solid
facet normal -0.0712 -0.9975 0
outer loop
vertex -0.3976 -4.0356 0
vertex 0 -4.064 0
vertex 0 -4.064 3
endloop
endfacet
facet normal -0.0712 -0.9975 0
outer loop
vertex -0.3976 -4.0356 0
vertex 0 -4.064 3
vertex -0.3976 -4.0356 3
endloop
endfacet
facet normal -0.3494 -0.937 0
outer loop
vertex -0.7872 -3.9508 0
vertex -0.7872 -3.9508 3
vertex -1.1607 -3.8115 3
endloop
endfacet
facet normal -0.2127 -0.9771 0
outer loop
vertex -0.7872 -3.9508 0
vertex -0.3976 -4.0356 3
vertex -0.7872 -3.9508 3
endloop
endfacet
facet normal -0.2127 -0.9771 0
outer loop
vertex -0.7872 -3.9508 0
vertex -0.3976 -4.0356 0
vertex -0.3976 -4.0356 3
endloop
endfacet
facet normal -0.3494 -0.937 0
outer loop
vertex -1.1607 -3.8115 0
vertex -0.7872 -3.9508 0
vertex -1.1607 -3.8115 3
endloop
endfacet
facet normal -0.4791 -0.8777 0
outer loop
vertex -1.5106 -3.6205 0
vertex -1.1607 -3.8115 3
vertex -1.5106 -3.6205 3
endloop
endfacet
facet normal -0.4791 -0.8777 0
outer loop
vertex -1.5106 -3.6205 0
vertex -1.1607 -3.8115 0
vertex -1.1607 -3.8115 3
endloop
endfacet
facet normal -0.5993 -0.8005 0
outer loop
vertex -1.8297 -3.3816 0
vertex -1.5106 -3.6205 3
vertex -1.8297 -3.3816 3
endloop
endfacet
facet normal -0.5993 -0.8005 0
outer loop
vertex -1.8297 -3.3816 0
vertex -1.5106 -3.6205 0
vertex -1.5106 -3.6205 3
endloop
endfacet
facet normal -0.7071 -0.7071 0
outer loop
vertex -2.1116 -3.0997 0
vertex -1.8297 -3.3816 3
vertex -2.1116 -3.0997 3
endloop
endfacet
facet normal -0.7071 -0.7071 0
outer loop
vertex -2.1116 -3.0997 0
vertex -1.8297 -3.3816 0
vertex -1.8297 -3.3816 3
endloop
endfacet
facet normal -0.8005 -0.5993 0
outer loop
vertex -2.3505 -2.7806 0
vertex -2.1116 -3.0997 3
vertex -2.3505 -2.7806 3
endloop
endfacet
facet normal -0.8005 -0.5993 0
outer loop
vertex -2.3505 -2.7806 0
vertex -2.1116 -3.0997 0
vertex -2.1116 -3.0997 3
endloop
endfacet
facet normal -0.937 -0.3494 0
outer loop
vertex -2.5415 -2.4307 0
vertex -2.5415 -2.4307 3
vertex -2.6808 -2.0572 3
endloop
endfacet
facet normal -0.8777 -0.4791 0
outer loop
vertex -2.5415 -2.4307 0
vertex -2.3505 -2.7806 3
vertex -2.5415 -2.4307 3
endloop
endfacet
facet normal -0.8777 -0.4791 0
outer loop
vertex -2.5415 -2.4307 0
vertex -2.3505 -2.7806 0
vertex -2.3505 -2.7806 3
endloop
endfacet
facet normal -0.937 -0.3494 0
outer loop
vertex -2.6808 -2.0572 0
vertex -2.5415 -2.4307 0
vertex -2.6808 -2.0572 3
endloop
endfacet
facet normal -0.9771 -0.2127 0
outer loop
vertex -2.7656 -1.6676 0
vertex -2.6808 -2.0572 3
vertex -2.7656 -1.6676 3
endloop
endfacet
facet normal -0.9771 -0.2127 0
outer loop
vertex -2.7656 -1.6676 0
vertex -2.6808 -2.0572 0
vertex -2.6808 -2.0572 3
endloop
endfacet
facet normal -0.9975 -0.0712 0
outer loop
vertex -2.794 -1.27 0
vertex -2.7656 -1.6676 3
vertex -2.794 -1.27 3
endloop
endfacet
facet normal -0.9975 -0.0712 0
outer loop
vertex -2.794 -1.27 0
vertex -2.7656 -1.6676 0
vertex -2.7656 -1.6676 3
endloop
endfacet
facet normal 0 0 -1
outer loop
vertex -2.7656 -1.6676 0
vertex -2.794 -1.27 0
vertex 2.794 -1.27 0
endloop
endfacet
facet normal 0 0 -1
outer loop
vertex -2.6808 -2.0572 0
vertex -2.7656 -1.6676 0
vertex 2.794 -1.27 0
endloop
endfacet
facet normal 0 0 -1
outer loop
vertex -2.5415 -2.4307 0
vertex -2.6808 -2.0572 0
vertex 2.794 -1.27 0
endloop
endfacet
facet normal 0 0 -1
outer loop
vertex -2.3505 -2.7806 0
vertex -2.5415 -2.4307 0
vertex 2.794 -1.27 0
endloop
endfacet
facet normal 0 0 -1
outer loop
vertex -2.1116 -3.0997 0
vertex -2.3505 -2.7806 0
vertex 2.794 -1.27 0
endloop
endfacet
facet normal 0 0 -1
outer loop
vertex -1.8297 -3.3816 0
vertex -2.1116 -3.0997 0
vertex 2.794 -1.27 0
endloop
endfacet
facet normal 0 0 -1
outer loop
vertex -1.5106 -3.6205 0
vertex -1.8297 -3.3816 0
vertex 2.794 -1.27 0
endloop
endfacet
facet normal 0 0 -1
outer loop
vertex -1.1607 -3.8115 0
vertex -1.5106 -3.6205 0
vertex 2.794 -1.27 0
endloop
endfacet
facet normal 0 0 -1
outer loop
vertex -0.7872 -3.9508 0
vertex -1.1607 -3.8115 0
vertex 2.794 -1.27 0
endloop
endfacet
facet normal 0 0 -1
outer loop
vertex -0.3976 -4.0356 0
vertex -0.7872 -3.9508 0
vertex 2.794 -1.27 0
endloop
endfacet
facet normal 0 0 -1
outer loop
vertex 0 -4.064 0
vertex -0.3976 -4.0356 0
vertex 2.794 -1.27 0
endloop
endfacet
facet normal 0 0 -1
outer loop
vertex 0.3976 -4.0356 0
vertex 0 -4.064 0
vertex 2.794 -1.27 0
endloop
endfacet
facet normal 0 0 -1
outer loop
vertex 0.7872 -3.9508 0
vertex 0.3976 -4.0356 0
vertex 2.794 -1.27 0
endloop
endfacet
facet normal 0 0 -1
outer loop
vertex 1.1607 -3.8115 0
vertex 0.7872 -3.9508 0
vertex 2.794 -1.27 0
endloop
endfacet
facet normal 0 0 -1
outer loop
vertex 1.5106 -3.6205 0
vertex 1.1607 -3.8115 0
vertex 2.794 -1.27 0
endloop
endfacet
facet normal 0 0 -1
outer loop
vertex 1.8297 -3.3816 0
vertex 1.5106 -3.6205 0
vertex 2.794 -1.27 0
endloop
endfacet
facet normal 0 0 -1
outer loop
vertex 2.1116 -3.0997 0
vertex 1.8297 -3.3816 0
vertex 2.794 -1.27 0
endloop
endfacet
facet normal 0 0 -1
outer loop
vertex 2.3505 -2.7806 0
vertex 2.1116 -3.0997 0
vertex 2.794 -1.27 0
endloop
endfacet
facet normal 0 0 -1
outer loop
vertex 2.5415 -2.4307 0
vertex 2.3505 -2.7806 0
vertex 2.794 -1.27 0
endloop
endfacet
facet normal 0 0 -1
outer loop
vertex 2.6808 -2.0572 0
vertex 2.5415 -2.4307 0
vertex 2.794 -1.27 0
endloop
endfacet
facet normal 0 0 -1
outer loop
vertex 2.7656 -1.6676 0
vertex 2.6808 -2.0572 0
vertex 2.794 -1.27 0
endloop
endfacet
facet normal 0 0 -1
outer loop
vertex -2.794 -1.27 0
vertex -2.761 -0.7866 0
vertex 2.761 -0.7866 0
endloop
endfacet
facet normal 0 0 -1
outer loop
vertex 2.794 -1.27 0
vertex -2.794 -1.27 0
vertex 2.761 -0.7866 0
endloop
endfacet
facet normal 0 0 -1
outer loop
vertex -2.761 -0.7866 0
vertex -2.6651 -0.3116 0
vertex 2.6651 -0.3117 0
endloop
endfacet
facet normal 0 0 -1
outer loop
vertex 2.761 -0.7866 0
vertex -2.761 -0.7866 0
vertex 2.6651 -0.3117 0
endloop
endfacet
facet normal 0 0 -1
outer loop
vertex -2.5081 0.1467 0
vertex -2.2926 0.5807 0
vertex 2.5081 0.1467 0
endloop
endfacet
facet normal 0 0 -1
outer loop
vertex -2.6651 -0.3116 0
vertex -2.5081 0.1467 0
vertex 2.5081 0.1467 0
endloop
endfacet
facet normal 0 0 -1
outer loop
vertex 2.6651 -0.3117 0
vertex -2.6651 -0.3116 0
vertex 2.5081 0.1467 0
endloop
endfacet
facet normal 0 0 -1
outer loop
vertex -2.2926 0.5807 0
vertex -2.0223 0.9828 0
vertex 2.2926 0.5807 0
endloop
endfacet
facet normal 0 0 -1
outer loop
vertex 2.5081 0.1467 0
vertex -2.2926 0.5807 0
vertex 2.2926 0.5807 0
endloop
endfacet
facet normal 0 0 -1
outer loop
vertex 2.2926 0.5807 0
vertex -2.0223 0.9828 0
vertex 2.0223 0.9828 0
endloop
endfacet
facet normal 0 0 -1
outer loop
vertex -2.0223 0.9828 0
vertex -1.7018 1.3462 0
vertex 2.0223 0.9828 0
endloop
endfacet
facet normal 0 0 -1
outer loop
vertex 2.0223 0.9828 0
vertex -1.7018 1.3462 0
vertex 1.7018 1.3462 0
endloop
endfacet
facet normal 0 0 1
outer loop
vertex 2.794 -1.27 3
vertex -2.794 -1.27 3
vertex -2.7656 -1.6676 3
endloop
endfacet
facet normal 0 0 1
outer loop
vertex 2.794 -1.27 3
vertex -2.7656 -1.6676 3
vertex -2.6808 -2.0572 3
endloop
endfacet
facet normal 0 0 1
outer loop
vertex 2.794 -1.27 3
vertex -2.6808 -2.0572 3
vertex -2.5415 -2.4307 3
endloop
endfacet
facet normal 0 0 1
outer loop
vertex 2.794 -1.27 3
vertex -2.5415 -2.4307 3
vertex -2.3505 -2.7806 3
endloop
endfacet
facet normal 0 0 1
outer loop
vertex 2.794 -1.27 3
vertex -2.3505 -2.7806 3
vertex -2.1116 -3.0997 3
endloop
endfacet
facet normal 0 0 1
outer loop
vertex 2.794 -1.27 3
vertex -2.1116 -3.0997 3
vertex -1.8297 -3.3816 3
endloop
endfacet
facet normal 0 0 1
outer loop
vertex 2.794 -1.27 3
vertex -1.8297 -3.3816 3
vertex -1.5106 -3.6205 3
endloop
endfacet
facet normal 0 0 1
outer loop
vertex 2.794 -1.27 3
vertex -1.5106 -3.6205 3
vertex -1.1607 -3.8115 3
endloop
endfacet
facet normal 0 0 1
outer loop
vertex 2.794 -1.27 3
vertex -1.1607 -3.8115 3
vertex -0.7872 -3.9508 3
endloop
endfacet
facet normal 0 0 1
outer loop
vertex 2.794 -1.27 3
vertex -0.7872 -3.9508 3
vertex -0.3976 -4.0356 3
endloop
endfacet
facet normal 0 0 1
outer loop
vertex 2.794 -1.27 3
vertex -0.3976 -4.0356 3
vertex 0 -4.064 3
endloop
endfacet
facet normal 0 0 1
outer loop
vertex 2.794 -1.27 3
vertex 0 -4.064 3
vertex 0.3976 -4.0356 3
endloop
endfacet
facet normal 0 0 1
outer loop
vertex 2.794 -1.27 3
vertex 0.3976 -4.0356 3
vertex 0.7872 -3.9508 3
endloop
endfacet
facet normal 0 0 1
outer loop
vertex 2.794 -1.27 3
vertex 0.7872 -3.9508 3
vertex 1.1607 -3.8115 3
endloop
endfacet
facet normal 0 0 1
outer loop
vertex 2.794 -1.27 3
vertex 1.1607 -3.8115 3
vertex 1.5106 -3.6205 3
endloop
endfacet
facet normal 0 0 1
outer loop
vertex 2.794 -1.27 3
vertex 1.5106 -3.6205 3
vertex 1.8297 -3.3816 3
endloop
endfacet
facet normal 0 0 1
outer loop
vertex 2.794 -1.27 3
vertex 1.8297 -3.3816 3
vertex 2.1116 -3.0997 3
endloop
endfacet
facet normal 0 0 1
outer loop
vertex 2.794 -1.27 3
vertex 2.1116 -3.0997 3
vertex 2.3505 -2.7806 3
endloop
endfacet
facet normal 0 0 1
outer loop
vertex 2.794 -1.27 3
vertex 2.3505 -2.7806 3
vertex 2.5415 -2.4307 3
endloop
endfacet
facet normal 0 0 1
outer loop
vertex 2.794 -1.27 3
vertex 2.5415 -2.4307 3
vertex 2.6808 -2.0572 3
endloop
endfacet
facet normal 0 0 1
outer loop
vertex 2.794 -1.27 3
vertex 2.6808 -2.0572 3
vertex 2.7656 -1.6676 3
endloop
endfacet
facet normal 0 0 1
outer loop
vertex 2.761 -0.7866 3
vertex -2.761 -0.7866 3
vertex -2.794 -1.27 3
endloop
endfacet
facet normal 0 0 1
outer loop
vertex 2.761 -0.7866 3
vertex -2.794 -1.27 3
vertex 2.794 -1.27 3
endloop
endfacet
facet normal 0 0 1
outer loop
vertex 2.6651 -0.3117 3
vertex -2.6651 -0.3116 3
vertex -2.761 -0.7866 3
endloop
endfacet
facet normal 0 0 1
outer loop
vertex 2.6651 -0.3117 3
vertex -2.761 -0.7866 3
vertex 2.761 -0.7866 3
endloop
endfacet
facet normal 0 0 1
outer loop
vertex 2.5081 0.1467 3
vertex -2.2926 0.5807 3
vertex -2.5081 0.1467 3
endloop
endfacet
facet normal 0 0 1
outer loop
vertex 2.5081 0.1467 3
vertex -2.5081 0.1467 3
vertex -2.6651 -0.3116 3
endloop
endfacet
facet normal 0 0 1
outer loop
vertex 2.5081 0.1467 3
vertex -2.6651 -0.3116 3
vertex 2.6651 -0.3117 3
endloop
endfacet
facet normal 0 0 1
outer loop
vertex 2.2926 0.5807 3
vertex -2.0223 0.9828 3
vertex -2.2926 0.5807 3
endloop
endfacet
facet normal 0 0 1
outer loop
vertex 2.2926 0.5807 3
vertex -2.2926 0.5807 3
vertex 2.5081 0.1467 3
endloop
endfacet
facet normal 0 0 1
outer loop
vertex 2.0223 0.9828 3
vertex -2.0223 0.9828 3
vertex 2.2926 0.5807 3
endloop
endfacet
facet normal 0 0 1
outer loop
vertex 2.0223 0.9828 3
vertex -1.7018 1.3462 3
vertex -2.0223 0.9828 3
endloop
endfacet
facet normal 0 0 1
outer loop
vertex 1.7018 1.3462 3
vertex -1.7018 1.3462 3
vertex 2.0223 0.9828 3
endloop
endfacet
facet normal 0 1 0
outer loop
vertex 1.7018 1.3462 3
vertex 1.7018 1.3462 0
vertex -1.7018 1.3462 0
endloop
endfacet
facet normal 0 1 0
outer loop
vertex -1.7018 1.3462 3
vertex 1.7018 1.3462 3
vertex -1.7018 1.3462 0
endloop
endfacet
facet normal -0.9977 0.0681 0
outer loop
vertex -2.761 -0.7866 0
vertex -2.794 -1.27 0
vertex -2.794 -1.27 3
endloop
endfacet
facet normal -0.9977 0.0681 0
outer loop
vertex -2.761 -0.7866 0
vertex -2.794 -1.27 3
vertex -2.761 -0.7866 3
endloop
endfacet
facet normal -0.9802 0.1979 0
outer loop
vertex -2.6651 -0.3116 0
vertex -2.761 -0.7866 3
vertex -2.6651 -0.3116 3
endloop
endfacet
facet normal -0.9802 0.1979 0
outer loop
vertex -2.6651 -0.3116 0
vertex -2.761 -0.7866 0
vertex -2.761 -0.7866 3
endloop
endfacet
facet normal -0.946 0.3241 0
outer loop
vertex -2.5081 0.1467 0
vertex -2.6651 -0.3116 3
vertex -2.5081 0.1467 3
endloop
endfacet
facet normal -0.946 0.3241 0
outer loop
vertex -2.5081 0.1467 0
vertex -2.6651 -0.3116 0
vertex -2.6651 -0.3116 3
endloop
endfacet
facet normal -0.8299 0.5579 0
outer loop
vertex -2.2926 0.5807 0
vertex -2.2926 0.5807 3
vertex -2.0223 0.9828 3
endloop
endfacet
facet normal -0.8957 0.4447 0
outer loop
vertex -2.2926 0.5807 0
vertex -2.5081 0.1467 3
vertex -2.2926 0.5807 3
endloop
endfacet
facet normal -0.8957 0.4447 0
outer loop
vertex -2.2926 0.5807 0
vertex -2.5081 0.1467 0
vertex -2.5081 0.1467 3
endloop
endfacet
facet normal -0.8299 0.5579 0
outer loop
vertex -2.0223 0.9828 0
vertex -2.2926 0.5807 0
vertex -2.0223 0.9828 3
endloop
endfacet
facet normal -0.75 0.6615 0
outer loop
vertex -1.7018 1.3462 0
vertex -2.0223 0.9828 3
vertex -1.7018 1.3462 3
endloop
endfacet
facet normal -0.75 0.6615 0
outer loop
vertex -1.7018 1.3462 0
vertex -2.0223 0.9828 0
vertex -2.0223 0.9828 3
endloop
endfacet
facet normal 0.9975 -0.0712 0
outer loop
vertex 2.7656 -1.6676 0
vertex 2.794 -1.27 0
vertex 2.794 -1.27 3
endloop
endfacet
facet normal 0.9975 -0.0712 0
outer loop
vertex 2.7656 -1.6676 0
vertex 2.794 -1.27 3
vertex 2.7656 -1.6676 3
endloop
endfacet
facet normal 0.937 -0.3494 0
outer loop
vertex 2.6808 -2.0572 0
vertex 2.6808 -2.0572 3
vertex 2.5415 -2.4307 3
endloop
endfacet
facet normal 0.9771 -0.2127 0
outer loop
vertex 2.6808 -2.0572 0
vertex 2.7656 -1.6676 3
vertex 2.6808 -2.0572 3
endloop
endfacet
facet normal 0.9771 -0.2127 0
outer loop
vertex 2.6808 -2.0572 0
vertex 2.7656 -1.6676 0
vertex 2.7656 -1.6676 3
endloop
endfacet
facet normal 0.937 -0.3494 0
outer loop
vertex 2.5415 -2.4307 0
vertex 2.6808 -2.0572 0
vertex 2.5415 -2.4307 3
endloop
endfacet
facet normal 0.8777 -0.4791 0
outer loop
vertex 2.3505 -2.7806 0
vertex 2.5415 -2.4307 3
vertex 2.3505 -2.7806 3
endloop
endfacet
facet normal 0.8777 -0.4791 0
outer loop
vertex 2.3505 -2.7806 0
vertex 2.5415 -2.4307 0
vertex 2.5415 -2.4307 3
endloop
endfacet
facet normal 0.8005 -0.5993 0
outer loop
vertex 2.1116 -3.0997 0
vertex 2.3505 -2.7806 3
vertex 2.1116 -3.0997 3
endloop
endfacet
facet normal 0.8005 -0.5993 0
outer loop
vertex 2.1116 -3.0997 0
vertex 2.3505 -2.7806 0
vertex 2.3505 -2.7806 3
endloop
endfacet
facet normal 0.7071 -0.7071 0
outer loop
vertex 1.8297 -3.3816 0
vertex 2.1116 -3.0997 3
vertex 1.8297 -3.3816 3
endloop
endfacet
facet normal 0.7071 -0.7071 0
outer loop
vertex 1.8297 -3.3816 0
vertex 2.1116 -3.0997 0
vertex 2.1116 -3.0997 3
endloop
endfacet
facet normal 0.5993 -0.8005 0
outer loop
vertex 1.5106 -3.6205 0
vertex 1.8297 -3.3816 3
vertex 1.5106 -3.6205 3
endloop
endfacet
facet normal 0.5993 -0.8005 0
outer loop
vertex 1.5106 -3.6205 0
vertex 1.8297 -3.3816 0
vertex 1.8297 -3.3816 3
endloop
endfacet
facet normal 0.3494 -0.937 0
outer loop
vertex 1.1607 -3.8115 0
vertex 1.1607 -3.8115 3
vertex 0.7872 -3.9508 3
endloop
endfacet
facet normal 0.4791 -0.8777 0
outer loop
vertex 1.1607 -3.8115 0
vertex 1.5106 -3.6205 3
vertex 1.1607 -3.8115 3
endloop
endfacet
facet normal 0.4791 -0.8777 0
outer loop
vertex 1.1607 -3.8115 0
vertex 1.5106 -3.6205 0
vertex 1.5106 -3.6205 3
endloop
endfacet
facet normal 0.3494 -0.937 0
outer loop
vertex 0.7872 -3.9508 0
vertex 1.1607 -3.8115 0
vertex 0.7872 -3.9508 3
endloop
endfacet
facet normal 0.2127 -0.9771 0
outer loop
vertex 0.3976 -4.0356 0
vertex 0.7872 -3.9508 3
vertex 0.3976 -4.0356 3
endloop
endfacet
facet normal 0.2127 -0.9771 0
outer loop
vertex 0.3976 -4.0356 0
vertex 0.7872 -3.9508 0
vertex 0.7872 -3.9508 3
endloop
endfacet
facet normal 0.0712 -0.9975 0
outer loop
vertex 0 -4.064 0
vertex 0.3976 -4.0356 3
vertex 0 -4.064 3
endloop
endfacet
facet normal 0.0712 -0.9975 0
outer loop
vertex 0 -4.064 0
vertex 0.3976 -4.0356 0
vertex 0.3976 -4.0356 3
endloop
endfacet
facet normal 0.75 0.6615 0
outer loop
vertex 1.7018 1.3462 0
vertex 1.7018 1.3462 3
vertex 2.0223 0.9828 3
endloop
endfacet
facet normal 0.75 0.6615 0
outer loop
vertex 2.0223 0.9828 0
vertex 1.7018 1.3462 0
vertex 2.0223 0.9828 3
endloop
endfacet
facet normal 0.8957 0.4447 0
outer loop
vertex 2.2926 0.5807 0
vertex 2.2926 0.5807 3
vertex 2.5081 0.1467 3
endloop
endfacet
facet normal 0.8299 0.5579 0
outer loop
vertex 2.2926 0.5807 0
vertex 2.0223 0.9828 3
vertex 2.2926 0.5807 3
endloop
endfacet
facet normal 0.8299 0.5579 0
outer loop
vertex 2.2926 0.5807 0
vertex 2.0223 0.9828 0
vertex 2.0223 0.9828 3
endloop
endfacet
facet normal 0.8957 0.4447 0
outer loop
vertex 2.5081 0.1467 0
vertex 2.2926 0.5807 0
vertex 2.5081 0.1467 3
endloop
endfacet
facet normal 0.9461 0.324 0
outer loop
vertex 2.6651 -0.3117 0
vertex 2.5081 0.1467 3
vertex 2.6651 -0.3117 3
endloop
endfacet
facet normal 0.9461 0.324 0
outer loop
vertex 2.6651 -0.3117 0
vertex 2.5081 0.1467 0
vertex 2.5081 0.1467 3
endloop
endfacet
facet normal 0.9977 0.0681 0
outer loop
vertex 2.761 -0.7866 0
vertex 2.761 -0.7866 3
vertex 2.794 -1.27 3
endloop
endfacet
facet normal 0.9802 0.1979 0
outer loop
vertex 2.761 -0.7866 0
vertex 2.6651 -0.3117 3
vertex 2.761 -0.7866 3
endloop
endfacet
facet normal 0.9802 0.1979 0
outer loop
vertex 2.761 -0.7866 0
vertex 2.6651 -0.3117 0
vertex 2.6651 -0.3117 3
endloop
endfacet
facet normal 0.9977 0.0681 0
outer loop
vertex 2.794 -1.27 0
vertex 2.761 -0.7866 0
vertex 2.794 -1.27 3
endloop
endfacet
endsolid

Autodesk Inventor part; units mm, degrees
ref_plane "YZ Plane" through (0, 0, 0) normal (1, 0, 0) x (0, 1, 0)
ref_plane "XZ Plane" through (0, 0, 0) normal (0, 1, 0) x (-1, 0, 0)
ref_plane "XY Plane" through (0, 0, 0) normal (0, 0, 1) x (1, 0, 0)
sketch "LEDT175, LED_28" plane through (0, 0, 0) normal (0, 0, 1) x (1, 0, 0)
  arc A0 (-2.794, -1.27) -> (0, -4.064) centre (0, -1.27) ccw
  arc A1 (0, -4.064) -> (2.794, -1.27) centre (0, -1.27) ccw
  arc A2 (2.794, -1.27) -> (1.7018, 1.3462) centre (-0.9101, -1.2803) ccw
  line L0 (1.7018, 1.3462) -> (-1.7018, 1.3462)
  arc A3 (-1.7018, 1.3462) -> (-2.794, -1.27) centre (0.9101, -1.2803) ccw
extrude "Extrusion1" add sketch "LEDT175, LED_28" along normal blind 3
properties part number "LED"
